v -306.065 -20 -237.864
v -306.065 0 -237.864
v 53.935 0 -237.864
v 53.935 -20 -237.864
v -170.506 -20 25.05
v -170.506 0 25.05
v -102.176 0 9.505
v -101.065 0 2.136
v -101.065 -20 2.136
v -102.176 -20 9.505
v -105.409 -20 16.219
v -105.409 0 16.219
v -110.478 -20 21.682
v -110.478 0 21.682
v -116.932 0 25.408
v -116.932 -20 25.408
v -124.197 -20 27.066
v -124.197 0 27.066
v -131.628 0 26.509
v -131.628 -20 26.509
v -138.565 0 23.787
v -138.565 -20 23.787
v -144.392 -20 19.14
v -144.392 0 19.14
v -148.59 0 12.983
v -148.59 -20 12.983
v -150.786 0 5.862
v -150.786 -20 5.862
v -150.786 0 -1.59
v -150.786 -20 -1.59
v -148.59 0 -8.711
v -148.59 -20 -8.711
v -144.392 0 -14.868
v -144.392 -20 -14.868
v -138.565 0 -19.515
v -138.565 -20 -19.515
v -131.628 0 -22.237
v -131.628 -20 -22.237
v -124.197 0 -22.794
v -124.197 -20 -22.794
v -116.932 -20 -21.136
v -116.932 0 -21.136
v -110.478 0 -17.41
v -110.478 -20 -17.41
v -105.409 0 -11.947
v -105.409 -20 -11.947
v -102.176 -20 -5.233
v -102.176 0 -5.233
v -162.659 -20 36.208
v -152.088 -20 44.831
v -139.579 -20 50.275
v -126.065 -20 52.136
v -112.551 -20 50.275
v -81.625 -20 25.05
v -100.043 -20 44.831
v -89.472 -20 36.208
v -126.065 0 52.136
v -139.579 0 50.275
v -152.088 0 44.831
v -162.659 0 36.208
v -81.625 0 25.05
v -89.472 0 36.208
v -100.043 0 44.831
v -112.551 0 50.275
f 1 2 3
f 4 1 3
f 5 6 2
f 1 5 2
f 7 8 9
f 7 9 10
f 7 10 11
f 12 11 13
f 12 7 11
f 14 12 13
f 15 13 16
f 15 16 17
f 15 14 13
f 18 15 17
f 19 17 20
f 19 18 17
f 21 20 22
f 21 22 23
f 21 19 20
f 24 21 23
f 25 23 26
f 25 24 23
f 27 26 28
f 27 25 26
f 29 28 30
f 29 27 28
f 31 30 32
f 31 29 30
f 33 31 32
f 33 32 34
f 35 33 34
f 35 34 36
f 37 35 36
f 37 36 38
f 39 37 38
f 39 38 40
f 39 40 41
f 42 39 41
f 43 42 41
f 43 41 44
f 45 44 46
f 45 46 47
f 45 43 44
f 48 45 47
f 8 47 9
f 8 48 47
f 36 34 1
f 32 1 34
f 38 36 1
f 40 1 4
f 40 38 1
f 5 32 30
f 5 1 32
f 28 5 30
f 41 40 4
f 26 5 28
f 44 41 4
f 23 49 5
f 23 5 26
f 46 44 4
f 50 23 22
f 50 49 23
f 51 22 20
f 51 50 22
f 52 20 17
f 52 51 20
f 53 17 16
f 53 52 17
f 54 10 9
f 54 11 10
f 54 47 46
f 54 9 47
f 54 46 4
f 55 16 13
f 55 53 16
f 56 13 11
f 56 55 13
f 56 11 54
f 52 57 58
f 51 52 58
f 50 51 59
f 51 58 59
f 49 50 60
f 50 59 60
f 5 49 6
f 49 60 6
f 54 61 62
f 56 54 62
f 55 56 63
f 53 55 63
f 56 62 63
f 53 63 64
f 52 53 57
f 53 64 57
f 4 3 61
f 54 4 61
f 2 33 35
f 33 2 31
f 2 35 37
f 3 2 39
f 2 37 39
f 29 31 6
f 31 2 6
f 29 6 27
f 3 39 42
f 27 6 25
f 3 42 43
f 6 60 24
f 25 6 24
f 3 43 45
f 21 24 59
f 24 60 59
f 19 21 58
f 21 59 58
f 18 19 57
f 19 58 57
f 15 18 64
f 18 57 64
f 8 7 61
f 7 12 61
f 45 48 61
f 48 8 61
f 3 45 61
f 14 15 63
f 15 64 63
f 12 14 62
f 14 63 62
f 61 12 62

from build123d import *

# Parameters (mm, degrees)
F0_R     = 25
F1_DEPTH = 20


with BuildPart() as f1:
    # F0 (on Front) → F1 (new body)
    with BuildSketch(Plane.XZ):
        with BuildLine():
            Line((-126.065396, -237.863924), (53.934604, -237.863924))
            Line((53.934604, -237.863924), (-81.624864, 25.049808))
            ThreePointArc((-81.624864, 25.049808), (-100.043162, 44.830845), (-126.065396, 52.136076))
            ThreePointArc((-126.065396, 52.136076), (-152.087631, 44.830845), (-170.505928, 25.049808))
            Line((-170.505928, 25.049808), (-306.065396, -237.863924))
            Line((-306.065396, -237.863924), (-126.065396, -237.863924))
        make_face()
        with Locations((-126.065396, 2.136076)):
            Circle(F0_R, mode=Mode.SUBTRACT)
    extrude(amount=F1_DEPTH)


solid = f1.part
